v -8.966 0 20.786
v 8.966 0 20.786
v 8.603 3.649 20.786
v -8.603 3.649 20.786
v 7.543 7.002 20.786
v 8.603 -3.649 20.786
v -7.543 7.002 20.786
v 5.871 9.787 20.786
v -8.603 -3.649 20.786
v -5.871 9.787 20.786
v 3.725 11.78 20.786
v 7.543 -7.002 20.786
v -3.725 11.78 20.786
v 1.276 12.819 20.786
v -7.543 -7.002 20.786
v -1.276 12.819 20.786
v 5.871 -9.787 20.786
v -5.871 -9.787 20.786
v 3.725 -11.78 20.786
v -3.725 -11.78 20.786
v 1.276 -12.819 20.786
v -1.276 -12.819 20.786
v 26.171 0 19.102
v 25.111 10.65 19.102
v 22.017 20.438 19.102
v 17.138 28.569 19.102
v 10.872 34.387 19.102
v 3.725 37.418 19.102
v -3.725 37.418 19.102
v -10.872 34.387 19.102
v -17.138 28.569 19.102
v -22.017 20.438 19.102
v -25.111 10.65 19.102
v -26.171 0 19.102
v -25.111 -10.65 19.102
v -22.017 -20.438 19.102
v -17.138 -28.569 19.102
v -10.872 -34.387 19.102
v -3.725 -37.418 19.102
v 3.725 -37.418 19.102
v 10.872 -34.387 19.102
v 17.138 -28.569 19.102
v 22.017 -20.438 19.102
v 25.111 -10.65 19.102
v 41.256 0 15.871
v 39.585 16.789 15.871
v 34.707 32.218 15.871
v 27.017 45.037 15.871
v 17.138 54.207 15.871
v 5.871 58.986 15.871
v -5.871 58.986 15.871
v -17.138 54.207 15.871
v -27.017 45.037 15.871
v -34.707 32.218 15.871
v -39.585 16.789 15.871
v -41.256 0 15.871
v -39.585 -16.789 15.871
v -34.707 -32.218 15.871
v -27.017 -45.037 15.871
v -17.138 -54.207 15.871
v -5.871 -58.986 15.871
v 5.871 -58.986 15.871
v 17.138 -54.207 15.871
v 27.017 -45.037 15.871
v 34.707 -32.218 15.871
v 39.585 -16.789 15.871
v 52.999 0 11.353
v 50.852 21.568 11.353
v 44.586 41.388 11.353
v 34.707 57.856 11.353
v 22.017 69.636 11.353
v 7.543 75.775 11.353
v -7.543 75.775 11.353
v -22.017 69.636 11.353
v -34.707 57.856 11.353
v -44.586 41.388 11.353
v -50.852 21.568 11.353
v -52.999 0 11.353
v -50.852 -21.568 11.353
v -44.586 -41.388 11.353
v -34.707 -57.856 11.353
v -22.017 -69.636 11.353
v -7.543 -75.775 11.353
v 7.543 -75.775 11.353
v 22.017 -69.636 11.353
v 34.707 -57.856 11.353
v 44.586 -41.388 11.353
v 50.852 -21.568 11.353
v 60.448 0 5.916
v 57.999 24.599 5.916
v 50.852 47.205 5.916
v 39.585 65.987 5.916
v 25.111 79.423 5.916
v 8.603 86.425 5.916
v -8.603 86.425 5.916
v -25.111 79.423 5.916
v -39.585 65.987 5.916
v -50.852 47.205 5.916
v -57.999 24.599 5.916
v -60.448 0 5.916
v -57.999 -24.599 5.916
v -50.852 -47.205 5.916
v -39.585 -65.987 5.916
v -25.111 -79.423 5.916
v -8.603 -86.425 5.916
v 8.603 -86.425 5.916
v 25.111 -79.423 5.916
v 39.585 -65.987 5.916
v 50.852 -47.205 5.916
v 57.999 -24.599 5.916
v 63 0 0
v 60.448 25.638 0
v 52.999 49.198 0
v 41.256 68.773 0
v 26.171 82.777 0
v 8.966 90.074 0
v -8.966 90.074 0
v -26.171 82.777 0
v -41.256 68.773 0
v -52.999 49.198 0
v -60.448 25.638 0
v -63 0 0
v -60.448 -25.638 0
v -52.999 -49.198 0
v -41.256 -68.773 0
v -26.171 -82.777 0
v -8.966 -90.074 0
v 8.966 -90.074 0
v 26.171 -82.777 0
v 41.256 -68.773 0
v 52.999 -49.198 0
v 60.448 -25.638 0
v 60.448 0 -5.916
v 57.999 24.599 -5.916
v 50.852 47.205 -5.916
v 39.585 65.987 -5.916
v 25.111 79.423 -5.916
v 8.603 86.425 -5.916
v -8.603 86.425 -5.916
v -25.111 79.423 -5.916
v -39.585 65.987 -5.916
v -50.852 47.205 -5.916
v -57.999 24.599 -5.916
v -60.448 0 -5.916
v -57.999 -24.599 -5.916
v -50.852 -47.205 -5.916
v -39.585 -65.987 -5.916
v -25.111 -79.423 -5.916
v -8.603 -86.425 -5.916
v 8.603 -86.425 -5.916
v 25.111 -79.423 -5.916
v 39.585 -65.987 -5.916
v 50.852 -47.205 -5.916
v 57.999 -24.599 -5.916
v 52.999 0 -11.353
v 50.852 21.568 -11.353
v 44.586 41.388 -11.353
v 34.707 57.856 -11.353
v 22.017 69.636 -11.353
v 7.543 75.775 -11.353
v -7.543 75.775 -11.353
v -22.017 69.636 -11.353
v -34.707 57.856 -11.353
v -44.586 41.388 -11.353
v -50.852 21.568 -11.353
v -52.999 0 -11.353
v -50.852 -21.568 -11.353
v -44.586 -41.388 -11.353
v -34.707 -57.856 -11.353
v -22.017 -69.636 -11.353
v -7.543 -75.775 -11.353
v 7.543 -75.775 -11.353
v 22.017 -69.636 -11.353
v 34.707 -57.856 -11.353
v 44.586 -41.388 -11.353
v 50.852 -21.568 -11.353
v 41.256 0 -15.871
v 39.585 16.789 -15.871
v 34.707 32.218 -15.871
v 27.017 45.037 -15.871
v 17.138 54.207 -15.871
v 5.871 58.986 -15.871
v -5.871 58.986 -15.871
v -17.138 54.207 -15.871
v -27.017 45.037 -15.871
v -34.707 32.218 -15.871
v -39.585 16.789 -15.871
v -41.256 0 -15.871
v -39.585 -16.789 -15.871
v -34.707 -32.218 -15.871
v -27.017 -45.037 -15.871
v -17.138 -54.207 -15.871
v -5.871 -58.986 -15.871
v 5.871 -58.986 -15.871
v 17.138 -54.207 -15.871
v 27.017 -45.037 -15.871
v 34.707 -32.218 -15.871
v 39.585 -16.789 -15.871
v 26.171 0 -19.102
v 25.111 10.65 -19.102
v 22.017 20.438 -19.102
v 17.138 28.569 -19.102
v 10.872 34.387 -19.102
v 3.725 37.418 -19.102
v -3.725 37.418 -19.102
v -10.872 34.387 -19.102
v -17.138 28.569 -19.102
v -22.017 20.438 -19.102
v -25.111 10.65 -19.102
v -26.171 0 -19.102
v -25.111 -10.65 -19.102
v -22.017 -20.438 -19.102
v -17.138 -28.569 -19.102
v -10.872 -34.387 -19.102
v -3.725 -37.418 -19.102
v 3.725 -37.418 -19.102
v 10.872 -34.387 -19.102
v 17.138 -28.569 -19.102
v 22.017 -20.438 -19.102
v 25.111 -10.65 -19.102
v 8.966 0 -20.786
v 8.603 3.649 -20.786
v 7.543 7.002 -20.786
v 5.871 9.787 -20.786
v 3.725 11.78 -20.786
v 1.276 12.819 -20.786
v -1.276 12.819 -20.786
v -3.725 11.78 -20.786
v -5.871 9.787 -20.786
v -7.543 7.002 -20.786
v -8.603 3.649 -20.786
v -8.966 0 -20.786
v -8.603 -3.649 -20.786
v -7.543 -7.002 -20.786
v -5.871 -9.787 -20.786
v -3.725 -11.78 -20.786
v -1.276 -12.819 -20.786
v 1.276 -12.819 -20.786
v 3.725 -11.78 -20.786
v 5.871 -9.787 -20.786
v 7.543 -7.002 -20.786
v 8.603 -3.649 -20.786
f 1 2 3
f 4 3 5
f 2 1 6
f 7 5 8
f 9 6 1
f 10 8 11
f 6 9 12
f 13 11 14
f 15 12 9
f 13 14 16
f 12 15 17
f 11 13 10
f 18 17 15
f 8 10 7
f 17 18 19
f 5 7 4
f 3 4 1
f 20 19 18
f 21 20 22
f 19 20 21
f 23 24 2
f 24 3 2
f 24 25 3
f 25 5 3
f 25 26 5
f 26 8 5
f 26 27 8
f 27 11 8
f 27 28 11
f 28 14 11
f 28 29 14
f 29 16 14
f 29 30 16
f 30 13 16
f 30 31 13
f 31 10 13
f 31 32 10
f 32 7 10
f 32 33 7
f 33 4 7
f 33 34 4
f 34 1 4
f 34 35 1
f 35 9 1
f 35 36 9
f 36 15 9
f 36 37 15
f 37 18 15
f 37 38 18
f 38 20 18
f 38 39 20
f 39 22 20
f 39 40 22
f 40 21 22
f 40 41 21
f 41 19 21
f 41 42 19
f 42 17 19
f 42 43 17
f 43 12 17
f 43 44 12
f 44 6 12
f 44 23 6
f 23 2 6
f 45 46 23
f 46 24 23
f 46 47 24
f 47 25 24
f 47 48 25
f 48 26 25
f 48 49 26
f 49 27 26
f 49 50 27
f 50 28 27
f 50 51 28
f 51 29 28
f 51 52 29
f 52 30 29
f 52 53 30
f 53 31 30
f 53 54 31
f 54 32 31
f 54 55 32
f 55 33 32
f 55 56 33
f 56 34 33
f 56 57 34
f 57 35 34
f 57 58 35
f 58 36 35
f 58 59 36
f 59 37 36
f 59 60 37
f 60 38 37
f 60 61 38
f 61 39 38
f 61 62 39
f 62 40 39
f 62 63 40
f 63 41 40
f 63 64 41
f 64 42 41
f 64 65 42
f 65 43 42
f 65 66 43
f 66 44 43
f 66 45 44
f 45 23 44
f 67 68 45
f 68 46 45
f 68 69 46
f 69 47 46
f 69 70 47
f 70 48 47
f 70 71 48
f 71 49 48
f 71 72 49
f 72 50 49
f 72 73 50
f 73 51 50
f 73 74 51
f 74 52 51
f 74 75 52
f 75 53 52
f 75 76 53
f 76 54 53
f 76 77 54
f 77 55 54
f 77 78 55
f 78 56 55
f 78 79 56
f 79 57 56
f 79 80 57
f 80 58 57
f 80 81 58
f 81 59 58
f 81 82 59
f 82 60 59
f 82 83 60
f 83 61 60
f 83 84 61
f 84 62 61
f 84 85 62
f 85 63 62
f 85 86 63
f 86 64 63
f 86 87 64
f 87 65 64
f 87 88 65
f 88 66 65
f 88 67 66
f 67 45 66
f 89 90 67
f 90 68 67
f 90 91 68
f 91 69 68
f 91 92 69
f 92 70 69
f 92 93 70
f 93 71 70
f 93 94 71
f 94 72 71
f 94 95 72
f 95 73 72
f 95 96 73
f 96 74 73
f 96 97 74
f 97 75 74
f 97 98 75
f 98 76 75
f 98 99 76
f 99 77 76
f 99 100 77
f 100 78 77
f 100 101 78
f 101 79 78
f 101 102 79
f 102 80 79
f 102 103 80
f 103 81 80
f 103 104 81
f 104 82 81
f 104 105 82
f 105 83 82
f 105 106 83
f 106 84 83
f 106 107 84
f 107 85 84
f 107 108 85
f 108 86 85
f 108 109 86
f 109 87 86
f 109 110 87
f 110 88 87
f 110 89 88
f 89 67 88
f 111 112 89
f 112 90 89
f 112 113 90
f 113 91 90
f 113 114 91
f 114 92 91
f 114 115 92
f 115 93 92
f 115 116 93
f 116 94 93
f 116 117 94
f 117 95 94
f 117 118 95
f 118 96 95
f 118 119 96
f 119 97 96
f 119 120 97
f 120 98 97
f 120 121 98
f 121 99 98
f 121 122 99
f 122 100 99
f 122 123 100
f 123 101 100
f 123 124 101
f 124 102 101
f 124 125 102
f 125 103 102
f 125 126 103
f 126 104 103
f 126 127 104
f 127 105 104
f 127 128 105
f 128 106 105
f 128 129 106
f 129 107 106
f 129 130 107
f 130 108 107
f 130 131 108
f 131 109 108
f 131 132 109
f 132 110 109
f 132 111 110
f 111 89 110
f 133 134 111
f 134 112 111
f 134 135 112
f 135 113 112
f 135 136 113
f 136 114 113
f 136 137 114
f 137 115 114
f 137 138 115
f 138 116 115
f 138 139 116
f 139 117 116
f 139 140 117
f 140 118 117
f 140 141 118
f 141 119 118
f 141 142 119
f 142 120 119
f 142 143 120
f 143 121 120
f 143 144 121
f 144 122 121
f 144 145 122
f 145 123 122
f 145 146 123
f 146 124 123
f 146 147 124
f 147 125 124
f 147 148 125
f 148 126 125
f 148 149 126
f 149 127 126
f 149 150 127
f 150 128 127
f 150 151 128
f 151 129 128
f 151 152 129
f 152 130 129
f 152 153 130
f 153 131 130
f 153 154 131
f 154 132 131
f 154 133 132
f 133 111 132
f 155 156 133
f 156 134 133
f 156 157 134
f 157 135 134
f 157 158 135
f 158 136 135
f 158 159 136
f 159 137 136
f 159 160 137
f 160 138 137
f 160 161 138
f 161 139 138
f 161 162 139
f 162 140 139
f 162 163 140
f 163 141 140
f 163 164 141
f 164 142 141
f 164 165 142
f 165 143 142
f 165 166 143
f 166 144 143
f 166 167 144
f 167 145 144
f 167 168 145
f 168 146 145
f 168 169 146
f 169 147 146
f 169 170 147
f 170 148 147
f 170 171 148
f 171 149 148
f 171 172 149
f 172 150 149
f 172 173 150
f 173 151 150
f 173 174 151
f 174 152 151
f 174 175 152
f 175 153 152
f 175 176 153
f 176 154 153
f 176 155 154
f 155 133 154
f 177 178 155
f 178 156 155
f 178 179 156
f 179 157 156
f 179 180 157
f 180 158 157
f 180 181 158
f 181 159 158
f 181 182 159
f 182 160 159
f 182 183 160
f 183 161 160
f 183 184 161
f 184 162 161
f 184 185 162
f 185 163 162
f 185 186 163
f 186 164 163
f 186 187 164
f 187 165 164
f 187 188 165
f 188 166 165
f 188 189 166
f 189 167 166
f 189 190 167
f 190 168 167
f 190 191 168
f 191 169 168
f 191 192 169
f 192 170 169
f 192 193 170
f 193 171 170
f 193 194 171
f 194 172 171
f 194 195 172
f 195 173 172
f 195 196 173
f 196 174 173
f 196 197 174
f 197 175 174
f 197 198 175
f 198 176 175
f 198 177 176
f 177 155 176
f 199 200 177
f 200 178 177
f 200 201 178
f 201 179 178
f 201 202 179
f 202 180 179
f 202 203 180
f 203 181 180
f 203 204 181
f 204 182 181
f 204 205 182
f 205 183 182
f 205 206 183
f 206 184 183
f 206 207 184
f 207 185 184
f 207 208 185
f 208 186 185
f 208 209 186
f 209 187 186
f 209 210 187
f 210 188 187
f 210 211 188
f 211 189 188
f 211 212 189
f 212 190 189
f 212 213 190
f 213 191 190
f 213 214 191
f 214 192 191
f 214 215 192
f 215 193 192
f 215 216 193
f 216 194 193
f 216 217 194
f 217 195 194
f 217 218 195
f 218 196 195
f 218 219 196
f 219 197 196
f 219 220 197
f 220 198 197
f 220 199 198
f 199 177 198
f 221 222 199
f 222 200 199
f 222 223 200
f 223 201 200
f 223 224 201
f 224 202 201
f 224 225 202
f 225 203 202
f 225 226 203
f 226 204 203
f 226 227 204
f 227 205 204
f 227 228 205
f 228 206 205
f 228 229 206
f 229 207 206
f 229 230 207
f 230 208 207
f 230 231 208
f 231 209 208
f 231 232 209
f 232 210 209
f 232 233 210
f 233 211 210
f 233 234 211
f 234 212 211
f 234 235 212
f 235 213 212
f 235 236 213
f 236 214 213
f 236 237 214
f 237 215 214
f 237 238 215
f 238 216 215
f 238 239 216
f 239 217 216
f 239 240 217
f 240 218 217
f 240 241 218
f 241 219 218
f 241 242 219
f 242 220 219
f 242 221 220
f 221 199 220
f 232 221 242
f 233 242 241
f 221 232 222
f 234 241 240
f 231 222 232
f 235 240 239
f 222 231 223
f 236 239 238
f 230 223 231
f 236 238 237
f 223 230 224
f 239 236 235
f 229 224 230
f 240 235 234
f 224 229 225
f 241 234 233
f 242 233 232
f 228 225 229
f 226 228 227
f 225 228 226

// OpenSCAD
// Generated by SolidPython 1.0.1 on 2020-07-29 00:46:48


scale(v = [9, 13, 3]) {
	sphere(r = 7);
}
/***********************************************
*********      SolidPython code:      **********
************************************************
 
# import packages: SolidPython
from solid import *
from solid.utils import *
from itertools import chain, combinations, permutations


class Resize:

    def __init__(self, scad_file):
        self.scad_file = scad_file
        #self.scad_file = import_scad(scad_file)
        # cone/cylinder param:
        self.r1 = 0
        self.r2 = 0
        self.h = 0
        # rectangular prism param:
        self.w = 0
        self.l = 0
        # ellipse param:
        self.r = 0

    # import OpenScad code (file name corresponds to shape)


    # classify shape + parameters
    def assign(self, param1, param2, param3):
        if self.scad_file == 'cone.scad':
            self.r1 = param1
            self.r2 = param2
            self.h = param3
        elif self.scad_file == 'cylinder.scad':
            self.r1 = param1
            self.r2 = param2
            self.h = param3
        elif self.scad_file == 'rectangularPrism.scad':
            self.h = param1
            self.l = param2
            self.w = param3
        else:
            self.r = param1
            self.h = param2

    # resize parameters
    def iterate(self):
        x = range(3, 20, 2)
        i = 1
        if self.scad_file == 'cone.scad':
            tempList = list(permutations(x, 2))
            for temp in tempList:
                param1 = temp[0]
                param2 = temp[1]
                filepath = 'produced_scad_files/' + 'cone' + str(param1) + '_' + str(param2) + '_' + '.scad'
                scad_render_to_file(cylinder(h=param1, r1=param2, r2=0), filepath)

        elif self.scad_file == 'cylinder.scad':
            tempList = list(permutations(x, 3))
            for temp in tempList:
                param1 = temp[0]
                param2 = temp[1]
                filepath = 'produced_scad_files/' + 'cylinder' + str(param1) + '_' + str(param2) + '_' + '.scad'
                scad_render_to_file(cylinder(h=param1, r1=param2, r2=param2), filepath)

        elif self.scad_file == 'rectangularPrism.scad':
            tempList = list(permutations(x, 3))
            for temp in tempList:
                param1 = temp[0]
                param2 = temp[1]
                param3 = temp[2]
                filepath = 'produced_scad_files/' + 'rectangularPrism' + str(param1) + '_' + str(param2) + '_' + str(
                    param3) + '.scad'
                scad_render_to_file(cube(size=(param1, param2, param3)), filepath)

        elif self.scad_file == 'ellipse.scad':
            tempList = list(permutations(x, 4))
            for temp in tempList:
                param1 = temp[0]
                param2 = temp[1]
                param3 = temp[2]
                param4 = temp[3]
                filepath = 'produced_scad_files/' + 'ellipse' + str(param1) + '_' + str(param2) + '_' + str(param3) + '_' + str(param4) + '.scad'
                scad_render_to_file(scale([param1, param2, param3])(sphere(r=param4)), filepath)

    def render_to_scadfile(self):
        scad_render_to_file(scad, 'example.scad') 
 
************************************************/
